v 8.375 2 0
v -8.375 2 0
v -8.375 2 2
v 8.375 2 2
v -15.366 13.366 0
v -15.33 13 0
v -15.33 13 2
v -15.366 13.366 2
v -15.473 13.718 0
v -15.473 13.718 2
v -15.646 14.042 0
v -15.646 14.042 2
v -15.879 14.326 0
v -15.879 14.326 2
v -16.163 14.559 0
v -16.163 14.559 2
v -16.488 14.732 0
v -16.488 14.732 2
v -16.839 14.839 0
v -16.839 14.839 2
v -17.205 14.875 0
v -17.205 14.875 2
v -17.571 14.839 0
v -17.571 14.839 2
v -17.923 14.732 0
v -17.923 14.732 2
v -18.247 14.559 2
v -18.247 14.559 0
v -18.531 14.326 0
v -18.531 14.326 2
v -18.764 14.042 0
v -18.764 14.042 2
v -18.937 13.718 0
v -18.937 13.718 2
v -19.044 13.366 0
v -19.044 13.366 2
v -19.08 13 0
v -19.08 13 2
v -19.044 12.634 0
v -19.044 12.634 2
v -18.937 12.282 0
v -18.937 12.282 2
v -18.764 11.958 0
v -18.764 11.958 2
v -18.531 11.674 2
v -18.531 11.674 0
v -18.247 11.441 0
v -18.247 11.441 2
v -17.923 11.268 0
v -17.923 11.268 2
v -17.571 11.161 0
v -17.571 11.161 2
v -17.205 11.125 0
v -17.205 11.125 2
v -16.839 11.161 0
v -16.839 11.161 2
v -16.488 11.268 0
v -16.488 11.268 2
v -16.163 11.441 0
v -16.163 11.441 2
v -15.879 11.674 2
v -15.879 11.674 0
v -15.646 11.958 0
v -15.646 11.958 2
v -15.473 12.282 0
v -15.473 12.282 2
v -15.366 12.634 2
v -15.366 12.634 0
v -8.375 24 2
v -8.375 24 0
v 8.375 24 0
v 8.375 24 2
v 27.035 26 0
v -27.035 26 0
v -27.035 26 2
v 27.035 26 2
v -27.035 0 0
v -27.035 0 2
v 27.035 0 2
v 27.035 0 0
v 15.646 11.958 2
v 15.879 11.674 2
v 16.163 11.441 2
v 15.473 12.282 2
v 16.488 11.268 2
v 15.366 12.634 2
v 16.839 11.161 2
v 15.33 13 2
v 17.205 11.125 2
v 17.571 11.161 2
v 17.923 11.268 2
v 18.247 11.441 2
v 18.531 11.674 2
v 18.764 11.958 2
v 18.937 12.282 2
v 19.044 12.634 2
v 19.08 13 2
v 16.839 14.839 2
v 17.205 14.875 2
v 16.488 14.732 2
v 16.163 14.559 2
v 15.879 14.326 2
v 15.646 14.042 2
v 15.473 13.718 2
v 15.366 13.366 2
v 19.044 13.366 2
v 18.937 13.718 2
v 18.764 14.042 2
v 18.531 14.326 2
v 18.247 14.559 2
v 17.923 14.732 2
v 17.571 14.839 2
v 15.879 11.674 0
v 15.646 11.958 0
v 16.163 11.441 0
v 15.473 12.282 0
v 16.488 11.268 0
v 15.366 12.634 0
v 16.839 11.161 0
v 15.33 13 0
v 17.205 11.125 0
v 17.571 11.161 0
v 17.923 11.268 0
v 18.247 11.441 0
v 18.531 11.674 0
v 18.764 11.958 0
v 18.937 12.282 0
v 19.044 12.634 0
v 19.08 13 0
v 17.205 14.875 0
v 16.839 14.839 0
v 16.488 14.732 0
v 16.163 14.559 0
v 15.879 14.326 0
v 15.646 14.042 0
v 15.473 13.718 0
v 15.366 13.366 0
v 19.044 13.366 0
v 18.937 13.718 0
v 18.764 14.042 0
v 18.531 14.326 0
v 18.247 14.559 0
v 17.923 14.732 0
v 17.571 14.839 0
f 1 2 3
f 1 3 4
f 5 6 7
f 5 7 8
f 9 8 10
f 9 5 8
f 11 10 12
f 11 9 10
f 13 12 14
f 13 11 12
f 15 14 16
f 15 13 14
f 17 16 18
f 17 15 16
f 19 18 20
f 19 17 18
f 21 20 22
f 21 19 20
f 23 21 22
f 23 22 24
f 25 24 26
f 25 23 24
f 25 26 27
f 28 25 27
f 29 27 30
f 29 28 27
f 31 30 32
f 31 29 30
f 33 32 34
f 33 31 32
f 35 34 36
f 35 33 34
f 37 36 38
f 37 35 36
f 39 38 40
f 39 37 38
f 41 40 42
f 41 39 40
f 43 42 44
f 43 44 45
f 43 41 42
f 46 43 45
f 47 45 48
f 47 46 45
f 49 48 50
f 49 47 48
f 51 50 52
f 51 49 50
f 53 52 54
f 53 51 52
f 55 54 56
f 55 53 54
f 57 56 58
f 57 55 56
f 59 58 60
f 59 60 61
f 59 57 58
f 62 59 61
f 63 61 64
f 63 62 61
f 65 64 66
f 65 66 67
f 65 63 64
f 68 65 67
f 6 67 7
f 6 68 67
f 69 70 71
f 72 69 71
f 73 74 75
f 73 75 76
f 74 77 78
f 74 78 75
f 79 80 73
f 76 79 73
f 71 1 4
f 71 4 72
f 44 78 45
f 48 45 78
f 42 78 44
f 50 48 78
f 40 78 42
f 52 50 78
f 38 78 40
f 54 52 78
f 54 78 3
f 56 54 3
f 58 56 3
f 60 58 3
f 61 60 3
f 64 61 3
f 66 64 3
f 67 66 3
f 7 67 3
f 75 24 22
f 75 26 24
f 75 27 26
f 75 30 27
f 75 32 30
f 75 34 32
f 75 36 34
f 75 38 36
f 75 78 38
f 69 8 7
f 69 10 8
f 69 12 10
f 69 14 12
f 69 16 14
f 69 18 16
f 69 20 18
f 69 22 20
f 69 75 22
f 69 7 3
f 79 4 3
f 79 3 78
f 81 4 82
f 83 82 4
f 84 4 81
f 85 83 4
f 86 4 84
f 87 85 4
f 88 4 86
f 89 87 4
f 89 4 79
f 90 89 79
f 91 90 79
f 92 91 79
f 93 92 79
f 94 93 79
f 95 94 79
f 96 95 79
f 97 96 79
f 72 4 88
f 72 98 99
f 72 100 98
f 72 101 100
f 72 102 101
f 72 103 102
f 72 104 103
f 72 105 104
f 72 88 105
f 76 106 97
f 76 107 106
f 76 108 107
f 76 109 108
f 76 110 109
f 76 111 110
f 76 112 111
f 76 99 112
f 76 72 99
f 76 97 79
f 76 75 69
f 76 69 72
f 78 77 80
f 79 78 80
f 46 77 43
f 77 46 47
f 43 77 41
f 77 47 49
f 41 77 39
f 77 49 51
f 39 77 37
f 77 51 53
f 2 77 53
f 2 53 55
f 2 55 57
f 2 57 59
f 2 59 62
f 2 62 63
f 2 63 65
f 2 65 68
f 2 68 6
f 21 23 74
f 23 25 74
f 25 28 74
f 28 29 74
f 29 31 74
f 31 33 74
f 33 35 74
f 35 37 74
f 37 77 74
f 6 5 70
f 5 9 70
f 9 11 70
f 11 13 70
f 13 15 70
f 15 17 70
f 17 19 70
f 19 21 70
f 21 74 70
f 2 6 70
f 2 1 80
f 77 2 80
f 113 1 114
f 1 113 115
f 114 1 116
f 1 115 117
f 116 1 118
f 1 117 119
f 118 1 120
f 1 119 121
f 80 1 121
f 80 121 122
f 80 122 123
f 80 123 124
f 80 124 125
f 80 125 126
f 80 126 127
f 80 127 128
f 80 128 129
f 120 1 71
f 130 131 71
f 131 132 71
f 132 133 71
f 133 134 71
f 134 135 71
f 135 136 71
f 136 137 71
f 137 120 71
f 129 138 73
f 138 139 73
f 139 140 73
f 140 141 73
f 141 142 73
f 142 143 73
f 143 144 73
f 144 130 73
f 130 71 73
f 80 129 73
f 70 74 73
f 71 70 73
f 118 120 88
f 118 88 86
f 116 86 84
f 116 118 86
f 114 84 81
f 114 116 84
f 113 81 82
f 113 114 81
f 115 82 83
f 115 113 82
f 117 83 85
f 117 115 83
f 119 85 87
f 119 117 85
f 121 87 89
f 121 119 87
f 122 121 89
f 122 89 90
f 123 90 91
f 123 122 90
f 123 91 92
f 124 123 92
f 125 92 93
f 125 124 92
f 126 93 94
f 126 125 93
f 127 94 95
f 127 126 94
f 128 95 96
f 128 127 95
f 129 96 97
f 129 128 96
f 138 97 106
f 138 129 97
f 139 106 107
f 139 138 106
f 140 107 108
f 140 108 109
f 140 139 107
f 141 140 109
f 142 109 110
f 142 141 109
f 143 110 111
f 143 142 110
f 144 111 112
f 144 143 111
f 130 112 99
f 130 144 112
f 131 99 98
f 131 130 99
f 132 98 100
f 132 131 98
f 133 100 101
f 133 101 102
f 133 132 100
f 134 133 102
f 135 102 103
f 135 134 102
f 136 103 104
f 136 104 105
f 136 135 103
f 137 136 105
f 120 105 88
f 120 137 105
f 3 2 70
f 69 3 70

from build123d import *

# Parameters (mm, degrees)
SKETCH1_W           = 54.070507504
SKETCH1_H           = 26
SKETCH1_R           = 1.875
SKETCH1_W_2         = 16.75
SKETCH1_H_2         = 22
BOSS_EXTRUDE1_DEPTH = 2


with BuildPart() as part:
    # Sketch1 → Boss-Extrude1 (new body)
    with BuildSketch(Plane.XY):
        with Locations((0, 13)):
            Rectangle(SKETCH1_W, SKETCH1_H)
        with Locations(Location((17.205126876, 13, 0), (0, 0, 180))):
            Circle(SKETCH1_R, mode=Mode.SUBTRACT)
        with Locations((-17.205126876, 13)):
            Circle(SKETCH1_R, mode=Mode.SUBTRACT)
        with Locations((0, 13)):
            Rectangle(SKETCH1_W_2, SKETCH1_H_2, mode=Mode.SUBTRACT)
    extrude(amount=BOSS_EXTRUDE1_DEPTH)


solid = part.part
